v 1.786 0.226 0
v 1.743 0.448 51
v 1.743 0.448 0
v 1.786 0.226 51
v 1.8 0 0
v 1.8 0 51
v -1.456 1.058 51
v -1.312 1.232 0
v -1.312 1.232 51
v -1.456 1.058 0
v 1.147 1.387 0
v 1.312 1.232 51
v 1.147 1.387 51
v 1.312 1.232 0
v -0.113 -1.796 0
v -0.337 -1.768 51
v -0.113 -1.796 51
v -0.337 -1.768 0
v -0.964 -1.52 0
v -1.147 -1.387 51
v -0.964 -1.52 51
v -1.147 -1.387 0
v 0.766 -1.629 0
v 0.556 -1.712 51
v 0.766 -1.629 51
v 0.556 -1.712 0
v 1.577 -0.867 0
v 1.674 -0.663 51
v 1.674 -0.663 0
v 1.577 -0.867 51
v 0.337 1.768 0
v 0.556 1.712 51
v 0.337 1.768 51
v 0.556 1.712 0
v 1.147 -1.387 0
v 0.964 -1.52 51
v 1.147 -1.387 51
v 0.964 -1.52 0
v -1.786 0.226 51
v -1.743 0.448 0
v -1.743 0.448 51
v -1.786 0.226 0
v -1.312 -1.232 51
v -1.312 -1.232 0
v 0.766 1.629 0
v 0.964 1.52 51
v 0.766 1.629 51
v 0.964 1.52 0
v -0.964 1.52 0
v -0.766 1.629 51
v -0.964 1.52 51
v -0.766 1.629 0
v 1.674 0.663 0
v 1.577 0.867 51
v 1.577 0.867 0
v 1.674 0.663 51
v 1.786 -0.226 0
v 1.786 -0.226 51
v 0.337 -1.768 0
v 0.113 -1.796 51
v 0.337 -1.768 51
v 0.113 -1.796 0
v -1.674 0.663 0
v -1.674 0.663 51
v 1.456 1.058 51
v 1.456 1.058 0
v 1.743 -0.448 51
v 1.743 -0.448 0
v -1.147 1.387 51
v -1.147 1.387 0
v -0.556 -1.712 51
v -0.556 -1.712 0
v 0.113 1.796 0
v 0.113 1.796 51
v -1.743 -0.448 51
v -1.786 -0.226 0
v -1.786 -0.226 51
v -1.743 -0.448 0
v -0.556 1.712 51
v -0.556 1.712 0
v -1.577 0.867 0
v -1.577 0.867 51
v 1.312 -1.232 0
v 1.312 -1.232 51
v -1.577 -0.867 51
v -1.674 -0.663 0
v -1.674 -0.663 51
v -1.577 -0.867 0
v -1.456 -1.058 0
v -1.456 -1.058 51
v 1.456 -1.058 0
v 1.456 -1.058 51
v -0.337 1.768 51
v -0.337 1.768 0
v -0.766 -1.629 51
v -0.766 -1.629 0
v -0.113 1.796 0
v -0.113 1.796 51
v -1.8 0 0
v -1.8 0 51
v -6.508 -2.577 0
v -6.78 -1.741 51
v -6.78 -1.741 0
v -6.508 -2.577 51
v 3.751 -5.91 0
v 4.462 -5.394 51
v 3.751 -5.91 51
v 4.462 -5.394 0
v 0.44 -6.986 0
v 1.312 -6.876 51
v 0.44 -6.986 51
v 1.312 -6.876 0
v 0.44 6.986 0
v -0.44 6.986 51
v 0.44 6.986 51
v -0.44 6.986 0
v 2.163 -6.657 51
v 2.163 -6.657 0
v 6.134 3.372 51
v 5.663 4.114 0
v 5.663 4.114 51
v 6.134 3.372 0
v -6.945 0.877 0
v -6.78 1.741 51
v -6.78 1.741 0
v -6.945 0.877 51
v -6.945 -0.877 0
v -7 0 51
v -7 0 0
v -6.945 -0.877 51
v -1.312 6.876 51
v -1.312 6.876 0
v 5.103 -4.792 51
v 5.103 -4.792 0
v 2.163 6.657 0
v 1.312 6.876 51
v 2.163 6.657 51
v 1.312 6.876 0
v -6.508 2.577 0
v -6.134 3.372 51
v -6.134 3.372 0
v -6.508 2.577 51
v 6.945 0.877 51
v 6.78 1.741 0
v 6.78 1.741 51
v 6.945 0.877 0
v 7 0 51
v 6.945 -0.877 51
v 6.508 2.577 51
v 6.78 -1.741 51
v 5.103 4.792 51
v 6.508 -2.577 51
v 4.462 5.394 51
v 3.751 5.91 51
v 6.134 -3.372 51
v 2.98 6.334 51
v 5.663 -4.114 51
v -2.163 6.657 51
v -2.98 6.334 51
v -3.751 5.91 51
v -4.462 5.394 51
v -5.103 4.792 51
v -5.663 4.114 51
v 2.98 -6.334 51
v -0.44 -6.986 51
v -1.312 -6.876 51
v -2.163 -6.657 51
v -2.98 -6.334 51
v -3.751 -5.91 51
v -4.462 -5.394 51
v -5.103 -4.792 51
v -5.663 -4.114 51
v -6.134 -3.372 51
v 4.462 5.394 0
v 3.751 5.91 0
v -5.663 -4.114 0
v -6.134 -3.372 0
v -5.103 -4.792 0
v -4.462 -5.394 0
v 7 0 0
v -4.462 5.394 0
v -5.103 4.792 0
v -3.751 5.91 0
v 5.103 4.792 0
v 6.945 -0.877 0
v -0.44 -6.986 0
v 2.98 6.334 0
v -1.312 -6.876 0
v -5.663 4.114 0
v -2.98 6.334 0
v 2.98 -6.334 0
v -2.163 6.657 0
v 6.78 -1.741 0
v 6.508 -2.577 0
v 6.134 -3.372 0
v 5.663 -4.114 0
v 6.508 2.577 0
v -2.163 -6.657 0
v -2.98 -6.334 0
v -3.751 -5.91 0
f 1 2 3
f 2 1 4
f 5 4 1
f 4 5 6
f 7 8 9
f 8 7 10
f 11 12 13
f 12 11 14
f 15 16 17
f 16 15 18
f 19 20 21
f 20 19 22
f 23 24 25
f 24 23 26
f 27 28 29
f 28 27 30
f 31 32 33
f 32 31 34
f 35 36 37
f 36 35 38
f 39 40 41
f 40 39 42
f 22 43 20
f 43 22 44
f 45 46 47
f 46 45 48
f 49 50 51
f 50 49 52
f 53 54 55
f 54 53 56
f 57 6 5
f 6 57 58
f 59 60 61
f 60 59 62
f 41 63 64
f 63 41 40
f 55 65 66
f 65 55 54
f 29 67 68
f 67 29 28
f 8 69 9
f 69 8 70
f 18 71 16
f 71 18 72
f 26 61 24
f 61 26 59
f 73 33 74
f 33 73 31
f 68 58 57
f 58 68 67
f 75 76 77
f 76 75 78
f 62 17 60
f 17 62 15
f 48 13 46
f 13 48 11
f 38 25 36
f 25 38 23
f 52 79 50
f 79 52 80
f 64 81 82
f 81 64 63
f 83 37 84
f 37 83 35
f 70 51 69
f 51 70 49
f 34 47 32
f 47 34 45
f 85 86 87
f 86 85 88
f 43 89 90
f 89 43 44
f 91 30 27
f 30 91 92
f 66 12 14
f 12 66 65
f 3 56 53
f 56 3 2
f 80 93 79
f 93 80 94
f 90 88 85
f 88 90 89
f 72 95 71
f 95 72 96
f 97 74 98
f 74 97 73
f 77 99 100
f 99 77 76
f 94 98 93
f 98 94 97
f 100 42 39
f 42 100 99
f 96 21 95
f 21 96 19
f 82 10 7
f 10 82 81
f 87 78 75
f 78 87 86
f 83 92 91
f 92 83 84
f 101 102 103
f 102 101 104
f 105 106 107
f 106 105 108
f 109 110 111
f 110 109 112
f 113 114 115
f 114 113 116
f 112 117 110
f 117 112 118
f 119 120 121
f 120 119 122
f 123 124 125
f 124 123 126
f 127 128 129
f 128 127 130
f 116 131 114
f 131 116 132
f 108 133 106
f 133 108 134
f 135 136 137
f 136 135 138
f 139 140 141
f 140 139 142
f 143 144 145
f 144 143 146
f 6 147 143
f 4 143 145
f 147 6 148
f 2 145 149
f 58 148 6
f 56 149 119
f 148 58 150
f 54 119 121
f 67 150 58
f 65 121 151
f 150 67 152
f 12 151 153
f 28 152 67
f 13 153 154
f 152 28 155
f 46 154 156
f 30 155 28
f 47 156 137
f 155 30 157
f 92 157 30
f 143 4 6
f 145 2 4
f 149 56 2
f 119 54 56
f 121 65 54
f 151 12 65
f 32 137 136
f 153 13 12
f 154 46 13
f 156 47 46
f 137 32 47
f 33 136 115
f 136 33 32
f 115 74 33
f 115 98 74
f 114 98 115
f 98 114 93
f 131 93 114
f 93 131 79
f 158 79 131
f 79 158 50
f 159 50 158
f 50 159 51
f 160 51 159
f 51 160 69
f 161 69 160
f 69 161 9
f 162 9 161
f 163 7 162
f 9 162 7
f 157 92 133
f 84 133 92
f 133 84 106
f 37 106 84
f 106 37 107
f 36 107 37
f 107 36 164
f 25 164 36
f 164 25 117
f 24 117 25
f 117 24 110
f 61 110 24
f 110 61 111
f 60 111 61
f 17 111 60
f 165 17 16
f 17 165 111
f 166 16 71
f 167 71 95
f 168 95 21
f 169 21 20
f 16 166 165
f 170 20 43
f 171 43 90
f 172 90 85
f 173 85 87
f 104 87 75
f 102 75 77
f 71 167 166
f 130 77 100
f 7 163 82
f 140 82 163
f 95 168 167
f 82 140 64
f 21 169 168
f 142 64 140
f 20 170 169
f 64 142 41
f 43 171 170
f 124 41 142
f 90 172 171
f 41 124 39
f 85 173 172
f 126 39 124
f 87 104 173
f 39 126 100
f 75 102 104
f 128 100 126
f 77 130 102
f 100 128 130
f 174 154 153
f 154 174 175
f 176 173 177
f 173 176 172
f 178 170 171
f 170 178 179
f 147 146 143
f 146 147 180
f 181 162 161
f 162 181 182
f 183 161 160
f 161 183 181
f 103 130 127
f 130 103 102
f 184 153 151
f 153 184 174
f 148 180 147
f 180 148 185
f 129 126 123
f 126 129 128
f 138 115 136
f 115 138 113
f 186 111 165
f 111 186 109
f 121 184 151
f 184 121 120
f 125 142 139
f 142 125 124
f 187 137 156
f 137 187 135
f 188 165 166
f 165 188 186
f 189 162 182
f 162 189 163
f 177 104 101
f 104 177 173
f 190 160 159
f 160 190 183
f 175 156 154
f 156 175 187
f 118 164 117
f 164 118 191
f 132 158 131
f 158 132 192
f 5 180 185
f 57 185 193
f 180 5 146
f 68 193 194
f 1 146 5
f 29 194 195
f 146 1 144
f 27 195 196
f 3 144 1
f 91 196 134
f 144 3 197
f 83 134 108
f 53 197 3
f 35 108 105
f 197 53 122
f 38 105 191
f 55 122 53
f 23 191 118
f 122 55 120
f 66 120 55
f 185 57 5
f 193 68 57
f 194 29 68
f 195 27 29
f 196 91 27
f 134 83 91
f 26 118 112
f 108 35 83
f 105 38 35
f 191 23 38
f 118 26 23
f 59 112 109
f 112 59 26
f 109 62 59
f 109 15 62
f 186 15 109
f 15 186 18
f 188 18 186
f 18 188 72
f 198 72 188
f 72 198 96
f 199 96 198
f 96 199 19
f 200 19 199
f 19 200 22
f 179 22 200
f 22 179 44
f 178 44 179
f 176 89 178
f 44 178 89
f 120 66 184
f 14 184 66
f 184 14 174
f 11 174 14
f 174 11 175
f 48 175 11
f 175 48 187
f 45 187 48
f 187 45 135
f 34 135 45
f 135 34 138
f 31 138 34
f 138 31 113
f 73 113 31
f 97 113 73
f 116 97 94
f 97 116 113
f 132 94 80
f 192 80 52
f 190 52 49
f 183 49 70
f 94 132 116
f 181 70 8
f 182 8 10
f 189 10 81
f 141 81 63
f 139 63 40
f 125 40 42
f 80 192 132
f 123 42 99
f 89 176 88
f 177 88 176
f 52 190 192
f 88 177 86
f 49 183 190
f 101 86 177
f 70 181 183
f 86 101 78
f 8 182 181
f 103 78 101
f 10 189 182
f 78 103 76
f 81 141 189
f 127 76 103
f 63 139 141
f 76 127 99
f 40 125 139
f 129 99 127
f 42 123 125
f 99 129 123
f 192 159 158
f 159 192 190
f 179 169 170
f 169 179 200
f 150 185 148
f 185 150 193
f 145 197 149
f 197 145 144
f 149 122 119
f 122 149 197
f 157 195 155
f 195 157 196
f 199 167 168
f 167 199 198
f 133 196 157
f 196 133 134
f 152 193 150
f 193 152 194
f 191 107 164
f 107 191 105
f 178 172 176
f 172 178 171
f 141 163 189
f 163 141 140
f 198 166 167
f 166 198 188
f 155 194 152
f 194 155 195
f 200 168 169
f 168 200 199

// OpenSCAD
$fn = 50;


difference() {
	union() {
		cylinder(h = 51, r = 7.0000000000);
	}
	union() {
		translate(v = [0.0000000000, 0.0000000000, -100.0000000000]) {
			cylinder(h = 200, r = 1.8000000000);
		}
		cylinder(h = 51, r = 1.8000000000);
		cylinder(h = 51, r = 1.8000000000);
		cylinder(h = 51, r = 1.8000000000);
	}
}
